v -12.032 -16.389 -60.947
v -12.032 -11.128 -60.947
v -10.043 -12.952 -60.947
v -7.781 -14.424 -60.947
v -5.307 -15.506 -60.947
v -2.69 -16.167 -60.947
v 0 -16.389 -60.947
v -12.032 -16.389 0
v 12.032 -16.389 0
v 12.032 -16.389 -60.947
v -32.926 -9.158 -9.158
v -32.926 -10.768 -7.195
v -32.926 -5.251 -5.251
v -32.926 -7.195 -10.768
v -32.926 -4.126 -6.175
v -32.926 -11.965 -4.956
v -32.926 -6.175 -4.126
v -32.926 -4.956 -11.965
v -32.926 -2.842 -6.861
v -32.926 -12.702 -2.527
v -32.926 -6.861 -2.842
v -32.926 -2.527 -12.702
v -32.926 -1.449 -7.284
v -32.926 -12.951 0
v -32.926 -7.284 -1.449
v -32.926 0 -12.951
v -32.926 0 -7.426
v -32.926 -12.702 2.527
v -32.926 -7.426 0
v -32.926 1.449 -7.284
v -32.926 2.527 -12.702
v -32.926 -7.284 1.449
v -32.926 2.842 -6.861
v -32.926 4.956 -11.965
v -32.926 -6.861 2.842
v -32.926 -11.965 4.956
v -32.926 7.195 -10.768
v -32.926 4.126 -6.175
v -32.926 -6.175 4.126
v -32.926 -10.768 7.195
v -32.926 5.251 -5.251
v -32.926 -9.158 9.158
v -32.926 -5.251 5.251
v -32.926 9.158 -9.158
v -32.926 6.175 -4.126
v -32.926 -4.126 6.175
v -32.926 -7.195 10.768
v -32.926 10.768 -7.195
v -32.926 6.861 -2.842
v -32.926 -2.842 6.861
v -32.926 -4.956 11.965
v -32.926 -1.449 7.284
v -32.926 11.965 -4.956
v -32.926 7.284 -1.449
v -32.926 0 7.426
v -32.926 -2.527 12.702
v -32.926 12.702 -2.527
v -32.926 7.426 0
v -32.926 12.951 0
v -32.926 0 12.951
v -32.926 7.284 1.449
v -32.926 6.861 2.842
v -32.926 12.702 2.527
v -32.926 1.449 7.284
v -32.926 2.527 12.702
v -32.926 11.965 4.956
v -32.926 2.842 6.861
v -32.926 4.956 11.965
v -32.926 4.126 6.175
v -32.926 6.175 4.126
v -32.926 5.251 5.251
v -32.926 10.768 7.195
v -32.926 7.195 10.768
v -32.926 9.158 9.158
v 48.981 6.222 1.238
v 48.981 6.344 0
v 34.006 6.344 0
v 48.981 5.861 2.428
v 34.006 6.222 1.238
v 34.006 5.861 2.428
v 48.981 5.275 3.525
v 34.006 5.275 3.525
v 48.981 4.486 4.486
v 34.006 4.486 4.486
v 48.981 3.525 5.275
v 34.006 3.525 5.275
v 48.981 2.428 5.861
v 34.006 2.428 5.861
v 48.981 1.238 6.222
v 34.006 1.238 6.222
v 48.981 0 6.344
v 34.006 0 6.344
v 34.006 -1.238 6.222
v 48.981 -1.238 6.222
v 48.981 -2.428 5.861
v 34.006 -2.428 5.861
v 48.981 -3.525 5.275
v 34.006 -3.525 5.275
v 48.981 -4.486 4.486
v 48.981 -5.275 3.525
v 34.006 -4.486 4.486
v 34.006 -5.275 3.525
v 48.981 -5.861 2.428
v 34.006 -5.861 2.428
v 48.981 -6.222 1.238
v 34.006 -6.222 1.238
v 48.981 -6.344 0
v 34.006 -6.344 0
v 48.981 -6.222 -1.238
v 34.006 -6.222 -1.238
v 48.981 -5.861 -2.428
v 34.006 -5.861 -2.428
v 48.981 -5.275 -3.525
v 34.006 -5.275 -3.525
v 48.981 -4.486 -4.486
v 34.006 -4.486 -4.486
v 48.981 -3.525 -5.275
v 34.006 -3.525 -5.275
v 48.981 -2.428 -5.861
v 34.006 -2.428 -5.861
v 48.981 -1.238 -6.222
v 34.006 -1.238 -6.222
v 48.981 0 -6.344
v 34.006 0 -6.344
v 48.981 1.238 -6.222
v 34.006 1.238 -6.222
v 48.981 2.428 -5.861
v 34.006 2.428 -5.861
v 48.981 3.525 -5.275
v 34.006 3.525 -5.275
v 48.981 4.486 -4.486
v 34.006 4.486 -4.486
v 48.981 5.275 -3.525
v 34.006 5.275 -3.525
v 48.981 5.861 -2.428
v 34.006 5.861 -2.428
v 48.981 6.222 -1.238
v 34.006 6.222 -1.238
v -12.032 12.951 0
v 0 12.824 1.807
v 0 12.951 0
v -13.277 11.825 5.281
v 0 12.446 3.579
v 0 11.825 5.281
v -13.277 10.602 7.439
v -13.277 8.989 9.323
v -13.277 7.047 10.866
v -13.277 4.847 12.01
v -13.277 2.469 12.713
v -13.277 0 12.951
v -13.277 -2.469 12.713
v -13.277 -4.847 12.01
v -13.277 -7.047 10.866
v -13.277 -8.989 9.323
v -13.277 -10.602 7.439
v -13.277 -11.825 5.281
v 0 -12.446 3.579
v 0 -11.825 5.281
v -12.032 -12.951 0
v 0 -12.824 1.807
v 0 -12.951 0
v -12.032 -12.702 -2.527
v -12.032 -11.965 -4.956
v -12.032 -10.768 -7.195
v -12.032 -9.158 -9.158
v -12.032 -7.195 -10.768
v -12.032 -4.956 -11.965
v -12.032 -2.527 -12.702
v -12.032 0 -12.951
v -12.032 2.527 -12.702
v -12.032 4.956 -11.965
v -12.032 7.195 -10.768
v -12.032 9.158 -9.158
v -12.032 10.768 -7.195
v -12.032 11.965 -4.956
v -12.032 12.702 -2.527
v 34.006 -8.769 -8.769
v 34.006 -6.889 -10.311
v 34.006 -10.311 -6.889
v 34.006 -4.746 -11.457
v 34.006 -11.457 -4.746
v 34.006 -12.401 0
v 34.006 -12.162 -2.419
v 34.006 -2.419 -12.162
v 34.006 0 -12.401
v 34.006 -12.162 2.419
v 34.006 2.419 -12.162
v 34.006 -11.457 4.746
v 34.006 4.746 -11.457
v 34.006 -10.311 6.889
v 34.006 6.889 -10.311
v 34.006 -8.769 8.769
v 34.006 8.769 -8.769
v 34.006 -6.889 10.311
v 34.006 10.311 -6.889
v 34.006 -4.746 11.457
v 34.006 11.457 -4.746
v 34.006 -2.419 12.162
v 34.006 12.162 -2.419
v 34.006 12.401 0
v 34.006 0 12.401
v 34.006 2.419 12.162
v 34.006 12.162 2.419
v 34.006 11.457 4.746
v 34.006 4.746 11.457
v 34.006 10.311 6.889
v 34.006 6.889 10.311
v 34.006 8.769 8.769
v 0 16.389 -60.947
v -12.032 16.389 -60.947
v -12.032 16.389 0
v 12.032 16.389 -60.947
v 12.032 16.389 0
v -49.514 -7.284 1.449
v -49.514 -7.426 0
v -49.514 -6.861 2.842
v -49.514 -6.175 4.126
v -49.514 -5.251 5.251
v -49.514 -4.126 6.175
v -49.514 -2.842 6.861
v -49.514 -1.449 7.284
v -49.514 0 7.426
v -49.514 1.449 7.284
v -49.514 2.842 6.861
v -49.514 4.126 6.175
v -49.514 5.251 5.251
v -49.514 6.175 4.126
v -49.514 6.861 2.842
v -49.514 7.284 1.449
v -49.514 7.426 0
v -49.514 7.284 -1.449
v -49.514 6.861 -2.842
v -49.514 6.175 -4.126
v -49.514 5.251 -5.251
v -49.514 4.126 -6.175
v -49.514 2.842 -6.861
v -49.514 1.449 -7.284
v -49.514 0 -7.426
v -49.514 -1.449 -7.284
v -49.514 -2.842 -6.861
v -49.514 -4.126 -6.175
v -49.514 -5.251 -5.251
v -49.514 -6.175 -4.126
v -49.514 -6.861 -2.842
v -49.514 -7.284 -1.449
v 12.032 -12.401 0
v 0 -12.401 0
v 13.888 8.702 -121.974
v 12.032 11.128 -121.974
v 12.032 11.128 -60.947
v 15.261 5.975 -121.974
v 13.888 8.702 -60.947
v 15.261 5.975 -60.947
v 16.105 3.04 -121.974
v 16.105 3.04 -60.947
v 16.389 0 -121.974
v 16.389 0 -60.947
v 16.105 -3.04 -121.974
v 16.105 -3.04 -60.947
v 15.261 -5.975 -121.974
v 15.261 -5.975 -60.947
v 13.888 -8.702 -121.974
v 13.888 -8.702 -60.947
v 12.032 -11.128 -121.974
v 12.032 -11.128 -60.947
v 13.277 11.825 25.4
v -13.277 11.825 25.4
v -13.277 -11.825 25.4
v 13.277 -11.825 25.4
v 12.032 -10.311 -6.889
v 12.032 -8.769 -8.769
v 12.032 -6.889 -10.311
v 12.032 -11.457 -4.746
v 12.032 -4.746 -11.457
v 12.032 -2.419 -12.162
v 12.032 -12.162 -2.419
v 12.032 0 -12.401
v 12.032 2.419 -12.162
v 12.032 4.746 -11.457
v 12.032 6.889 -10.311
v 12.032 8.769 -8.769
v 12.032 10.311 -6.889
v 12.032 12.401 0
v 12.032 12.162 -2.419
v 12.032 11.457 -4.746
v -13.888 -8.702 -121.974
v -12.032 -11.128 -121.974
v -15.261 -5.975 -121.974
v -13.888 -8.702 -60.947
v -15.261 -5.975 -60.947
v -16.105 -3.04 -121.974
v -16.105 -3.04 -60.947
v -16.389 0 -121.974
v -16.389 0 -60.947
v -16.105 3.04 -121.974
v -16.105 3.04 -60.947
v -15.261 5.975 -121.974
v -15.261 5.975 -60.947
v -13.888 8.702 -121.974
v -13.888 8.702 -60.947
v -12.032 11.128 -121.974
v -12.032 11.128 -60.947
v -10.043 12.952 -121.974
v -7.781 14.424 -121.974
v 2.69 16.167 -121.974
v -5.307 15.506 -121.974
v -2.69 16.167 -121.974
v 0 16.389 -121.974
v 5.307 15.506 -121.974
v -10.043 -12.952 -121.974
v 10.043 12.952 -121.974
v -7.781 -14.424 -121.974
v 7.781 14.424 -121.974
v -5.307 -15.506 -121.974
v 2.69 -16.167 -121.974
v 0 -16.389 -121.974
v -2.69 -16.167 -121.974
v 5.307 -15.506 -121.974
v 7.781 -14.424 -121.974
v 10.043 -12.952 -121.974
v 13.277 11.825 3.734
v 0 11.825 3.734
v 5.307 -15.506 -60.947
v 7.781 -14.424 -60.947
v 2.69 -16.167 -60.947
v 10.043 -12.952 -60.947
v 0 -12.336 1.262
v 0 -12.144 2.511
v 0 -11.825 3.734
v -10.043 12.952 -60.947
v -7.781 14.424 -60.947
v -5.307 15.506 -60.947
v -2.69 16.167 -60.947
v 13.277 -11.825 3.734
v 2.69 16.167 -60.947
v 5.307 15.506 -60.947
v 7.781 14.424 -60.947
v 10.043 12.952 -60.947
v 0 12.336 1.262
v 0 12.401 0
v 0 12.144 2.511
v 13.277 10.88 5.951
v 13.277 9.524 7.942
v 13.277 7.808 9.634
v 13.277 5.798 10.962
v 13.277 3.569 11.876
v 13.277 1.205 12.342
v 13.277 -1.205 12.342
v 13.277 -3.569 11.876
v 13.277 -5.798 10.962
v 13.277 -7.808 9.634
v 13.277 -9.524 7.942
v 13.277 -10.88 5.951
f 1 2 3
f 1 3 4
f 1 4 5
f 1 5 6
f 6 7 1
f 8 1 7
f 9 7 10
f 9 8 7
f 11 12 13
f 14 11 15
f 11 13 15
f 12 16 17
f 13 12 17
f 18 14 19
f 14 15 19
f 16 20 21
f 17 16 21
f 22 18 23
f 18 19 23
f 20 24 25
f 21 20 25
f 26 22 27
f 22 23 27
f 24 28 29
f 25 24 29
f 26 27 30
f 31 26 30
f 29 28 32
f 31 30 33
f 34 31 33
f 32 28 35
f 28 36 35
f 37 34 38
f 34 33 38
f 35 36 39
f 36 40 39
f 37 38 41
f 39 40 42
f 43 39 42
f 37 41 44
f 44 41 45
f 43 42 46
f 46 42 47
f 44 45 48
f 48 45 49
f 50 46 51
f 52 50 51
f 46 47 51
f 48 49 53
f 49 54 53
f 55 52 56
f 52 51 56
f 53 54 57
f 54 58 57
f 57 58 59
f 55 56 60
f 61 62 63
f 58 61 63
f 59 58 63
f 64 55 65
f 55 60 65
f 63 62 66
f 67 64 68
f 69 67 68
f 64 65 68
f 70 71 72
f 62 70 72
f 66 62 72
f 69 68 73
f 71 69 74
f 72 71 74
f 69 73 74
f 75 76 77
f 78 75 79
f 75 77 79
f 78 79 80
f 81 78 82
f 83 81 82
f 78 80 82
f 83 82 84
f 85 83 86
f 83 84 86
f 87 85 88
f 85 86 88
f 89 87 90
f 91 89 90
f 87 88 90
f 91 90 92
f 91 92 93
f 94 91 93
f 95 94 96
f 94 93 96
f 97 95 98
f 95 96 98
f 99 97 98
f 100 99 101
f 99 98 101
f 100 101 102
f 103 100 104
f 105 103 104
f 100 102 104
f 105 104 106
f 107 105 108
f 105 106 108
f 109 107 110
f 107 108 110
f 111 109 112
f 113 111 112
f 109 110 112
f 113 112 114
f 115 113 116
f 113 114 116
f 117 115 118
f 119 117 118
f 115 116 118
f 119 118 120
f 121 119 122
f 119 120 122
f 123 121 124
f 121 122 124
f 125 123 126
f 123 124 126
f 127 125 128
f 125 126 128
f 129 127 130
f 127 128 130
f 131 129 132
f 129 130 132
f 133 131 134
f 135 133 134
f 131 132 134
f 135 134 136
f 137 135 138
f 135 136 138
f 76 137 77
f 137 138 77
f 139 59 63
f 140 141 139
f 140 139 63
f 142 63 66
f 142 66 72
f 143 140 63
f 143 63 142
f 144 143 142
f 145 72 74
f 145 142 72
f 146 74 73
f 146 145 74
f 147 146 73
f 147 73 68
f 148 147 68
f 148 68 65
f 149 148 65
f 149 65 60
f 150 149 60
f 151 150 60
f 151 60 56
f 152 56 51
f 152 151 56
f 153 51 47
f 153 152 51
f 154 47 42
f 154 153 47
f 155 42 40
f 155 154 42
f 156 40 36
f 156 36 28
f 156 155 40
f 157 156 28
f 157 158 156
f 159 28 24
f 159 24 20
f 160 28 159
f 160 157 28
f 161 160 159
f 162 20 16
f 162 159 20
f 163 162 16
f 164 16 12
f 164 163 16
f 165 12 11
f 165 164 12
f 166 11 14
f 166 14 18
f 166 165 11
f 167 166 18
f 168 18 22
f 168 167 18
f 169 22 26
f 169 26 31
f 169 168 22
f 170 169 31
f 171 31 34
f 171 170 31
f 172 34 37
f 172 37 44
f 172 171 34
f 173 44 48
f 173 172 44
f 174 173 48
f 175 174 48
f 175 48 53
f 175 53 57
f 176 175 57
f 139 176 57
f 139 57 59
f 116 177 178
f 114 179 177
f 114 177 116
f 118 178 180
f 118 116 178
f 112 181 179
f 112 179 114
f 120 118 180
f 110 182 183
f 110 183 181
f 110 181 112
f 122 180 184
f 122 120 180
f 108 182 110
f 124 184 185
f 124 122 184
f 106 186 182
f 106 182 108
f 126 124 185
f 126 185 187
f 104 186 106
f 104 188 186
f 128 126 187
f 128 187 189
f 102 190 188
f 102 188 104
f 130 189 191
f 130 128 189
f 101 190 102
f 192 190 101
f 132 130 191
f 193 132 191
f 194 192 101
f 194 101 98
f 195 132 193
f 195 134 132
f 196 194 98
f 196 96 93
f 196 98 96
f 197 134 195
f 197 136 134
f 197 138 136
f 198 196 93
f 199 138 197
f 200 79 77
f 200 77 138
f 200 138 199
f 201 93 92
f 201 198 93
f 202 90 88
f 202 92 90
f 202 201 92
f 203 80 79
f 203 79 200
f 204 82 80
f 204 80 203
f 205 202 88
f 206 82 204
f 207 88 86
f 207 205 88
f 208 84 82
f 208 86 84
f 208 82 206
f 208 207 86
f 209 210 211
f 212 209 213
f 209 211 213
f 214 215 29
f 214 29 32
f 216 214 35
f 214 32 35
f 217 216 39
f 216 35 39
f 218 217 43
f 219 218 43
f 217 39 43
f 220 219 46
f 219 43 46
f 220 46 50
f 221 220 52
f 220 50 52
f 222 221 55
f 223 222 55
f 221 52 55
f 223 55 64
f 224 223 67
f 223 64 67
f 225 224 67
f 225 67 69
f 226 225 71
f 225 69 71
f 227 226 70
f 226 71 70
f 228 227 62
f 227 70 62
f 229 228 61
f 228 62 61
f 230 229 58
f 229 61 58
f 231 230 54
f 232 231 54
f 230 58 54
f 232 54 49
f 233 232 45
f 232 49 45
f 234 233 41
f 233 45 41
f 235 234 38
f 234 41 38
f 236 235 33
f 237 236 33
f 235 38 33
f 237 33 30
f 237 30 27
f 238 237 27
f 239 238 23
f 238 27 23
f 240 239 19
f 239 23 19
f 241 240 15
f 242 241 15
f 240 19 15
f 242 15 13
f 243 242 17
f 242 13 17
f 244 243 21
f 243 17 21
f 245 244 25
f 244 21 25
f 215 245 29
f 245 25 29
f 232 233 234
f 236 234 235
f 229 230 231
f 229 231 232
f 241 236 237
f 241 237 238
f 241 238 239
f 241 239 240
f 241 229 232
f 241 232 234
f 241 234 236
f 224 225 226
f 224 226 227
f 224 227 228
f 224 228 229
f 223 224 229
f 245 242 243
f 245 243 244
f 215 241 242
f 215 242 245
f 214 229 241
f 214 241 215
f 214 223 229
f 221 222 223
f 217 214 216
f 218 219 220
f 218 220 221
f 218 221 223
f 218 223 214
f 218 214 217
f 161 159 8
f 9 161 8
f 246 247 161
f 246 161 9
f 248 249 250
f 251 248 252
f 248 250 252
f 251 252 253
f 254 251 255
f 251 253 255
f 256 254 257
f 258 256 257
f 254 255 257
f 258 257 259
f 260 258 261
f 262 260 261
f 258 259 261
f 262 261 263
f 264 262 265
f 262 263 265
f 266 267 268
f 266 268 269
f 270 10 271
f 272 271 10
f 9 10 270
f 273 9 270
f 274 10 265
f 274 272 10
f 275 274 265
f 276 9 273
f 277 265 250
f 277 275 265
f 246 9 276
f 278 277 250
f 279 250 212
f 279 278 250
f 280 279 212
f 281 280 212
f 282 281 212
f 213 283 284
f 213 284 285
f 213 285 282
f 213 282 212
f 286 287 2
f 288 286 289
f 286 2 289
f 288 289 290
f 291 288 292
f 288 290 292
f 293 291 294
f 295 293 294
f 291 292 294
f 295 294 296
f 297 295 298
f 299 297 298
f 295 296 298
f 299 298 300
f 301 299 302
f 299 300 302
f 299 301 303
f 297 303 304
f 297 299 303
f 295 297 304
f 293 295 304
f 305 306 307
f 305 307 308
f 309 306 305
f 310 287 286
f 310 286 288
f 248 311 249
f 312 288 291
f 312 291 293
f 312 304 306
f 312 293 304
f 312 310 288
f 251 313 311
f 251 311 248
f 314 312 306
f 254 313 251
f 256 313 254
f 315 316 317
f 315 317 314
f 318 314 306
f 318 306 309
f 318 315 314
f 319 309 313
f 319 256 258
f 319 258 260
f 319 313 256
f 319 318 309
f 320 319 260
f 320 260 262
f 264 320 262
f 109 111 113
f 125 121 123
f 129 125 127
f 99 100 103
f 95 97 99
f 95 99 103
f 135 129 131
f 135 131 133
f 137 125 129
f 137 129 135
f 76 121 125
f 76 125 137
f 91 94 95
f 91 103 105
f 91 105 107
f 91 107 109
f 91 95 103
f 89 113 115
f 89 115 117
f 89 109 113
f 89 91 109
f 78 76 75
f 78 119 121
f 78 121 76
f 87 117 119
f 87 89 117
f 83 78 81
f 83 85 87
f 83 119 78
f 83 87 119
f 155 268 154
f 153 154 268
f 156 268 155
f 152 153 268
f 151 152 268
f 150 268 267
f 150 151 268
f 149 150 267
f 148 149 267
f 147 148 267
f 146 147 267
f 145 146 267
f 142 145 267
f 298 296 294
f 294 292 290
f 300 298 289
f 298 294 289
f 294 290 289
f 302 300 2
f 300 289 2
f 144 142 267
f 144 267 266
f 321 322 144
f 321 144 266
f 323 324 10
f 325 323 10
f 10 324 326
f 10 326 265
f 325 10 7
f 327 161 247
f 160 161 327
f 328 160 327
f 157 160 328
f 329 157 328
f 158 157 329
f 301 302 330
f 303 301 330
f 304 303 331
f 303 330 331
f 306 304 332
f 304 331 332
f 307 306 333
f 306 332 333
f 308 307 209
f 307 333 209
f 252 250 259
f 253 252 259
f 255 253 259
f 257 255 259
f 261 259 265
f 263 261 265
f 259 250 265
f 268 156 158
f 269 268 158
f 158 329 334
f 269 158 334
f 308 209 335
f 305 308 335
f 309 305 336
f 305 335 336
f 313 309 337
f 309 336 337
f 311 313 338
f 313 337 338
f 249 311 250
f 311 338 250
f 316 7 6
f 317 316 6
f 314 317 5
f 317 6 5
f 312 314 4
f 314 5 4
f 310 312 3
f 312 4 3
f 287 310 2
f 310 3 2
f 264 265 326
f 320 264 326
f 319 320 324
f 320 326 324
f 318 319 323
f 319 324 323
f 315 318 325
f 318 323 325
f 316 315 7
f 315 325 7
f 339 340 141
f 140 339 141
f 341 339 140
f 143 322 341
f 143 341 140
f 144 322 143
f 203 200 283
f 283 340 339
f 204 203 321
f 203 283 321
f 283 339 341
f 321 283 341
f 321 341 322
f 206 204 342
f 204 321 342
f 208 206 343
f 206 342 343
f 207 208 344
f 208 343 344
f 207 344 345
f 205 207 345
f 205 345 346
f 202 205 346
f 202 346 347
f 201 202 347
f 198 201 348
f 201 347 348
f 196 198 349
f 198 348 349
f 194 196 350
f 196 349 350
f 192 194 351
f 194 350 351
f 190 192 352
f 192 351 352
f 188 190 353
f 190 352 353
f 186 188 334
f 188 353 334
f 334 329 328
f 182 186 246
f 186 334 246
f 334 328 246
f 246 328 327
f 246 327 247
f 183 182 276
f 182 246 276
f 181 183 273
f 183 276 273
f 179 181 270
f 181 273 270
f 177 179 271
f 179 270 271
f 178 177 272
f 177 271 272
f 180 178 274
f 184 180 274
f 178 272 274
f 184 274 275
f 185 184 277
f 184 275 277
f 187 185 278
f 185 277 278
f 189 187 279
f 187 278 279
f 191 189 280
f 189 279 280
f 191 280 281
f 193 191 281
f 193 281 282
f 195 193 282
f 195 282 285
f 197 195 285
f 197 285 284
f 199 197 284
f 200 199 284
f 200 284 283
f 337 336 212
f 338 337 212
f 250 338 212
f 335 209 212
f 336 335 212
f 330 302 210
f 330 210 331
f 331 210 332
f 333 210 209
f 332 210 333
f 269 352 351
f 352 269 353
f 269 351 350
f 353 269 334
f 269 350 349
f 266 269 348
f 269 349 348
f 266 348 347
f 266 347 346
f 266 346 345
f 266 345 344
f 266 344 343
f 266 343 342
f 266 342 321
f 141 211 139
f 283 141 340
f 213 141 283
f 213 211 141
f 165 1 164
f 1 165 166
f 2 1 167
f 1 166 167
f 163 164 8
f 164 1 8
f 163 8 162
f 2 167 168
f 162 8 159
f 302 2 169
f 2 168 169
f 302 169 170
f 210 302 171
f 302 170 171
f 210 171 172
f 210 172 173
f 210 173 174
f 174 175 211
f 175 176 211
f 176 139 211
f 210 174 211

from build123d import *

# Parameters (mm, degrees)
F0_R      = 12.400699
F1_DEPTH  = 34.005828
F2_R      = 12.950879
F3_DEPTH  = 32.92565
F5_W      = 24.064958
F5_H      = 32.778248
F6_DEPTH  = 60.947001
F4_W      = 26.554584
F4_H      = 23.65014
F8_DEPTH  = 25.4
F7_R      = 6.344063
F9_DEPTH  = 14.975553
F10_R     = 7.426206
F11_DEPTH = 16.588198
F12_R     = 16.389124
F13_DEPTH = 61.027274


with BuildPart() as f1:
    # F0 (on Right) → F1 (new body)
    with BuildSketch(Plane.YZ):
        Circle(F0_R)
    extrude(amount=F1_DEPTH)

    # F2 (on Right) → F3 (join)
    with BuildSketch(Plane.YZ):
        Circle(F2_R)
    extrude(amount=-F3_DEPTH)

    # F5 (on Top) → F6 (join)
    with BuildSketch(Plane.XY):
        Rectangle(F5_W, F5_H)
    extrude(amount=-F6_DEPTH)

    # F4 (on Top) → F8 (join)
    with BuildSketch(Plane.XY):
        Rectangle(F4_W, F4_H)
    extrude(amount=F8_DEPTH)

    # F7 (on face) → F9 (join)
    with BuildSketch(Plane.YZ.offset(34.005828)):
        Circle(F7_R)
    extrude(amount=F9_DEPTH)

    # F10 (on face) → F11 (join)
    with BuildSketch(Plane(origin=(-32.92565, 0, 0), x_dir=(0, -1, 0), z_dir=(-1, 0, 0))):
        Circle(F10_R)
    extrude(amount=F11_DEPTH)

    # F12 (on face) → F13 (join)
    with BuildSketch(Plane(origin=(0, 0, -60.947001), x_dir=(1, 0, 0), z_dir=(0, 0, -1))):
        with BuildLine():
            Line((12.032479, -11.127571), (12.032479, 11.127571))
            ThreePointArc((12.032479, 11.127571), (6.566287, 15.016233), (0, 16.389124))
            ThreePointArc((0, 16.389124), (-6.566287, 15.016233), (-12.032479, 11.127571))
            Line((-12.032479, 11.127571), (-12.032479, -11.127571))
            ThreePointArc((-12.032479, -11.127571), (-6.566287, -15.016233), (0, -16.389124))
            ThreePointArc((0, -16.389124), (6.566287, -15.016233), (12.032479, -11.127571))
        make_face()
        Circle(F12_R)
    extrude(amount=F13_DEPTH)


solid = f1.part
